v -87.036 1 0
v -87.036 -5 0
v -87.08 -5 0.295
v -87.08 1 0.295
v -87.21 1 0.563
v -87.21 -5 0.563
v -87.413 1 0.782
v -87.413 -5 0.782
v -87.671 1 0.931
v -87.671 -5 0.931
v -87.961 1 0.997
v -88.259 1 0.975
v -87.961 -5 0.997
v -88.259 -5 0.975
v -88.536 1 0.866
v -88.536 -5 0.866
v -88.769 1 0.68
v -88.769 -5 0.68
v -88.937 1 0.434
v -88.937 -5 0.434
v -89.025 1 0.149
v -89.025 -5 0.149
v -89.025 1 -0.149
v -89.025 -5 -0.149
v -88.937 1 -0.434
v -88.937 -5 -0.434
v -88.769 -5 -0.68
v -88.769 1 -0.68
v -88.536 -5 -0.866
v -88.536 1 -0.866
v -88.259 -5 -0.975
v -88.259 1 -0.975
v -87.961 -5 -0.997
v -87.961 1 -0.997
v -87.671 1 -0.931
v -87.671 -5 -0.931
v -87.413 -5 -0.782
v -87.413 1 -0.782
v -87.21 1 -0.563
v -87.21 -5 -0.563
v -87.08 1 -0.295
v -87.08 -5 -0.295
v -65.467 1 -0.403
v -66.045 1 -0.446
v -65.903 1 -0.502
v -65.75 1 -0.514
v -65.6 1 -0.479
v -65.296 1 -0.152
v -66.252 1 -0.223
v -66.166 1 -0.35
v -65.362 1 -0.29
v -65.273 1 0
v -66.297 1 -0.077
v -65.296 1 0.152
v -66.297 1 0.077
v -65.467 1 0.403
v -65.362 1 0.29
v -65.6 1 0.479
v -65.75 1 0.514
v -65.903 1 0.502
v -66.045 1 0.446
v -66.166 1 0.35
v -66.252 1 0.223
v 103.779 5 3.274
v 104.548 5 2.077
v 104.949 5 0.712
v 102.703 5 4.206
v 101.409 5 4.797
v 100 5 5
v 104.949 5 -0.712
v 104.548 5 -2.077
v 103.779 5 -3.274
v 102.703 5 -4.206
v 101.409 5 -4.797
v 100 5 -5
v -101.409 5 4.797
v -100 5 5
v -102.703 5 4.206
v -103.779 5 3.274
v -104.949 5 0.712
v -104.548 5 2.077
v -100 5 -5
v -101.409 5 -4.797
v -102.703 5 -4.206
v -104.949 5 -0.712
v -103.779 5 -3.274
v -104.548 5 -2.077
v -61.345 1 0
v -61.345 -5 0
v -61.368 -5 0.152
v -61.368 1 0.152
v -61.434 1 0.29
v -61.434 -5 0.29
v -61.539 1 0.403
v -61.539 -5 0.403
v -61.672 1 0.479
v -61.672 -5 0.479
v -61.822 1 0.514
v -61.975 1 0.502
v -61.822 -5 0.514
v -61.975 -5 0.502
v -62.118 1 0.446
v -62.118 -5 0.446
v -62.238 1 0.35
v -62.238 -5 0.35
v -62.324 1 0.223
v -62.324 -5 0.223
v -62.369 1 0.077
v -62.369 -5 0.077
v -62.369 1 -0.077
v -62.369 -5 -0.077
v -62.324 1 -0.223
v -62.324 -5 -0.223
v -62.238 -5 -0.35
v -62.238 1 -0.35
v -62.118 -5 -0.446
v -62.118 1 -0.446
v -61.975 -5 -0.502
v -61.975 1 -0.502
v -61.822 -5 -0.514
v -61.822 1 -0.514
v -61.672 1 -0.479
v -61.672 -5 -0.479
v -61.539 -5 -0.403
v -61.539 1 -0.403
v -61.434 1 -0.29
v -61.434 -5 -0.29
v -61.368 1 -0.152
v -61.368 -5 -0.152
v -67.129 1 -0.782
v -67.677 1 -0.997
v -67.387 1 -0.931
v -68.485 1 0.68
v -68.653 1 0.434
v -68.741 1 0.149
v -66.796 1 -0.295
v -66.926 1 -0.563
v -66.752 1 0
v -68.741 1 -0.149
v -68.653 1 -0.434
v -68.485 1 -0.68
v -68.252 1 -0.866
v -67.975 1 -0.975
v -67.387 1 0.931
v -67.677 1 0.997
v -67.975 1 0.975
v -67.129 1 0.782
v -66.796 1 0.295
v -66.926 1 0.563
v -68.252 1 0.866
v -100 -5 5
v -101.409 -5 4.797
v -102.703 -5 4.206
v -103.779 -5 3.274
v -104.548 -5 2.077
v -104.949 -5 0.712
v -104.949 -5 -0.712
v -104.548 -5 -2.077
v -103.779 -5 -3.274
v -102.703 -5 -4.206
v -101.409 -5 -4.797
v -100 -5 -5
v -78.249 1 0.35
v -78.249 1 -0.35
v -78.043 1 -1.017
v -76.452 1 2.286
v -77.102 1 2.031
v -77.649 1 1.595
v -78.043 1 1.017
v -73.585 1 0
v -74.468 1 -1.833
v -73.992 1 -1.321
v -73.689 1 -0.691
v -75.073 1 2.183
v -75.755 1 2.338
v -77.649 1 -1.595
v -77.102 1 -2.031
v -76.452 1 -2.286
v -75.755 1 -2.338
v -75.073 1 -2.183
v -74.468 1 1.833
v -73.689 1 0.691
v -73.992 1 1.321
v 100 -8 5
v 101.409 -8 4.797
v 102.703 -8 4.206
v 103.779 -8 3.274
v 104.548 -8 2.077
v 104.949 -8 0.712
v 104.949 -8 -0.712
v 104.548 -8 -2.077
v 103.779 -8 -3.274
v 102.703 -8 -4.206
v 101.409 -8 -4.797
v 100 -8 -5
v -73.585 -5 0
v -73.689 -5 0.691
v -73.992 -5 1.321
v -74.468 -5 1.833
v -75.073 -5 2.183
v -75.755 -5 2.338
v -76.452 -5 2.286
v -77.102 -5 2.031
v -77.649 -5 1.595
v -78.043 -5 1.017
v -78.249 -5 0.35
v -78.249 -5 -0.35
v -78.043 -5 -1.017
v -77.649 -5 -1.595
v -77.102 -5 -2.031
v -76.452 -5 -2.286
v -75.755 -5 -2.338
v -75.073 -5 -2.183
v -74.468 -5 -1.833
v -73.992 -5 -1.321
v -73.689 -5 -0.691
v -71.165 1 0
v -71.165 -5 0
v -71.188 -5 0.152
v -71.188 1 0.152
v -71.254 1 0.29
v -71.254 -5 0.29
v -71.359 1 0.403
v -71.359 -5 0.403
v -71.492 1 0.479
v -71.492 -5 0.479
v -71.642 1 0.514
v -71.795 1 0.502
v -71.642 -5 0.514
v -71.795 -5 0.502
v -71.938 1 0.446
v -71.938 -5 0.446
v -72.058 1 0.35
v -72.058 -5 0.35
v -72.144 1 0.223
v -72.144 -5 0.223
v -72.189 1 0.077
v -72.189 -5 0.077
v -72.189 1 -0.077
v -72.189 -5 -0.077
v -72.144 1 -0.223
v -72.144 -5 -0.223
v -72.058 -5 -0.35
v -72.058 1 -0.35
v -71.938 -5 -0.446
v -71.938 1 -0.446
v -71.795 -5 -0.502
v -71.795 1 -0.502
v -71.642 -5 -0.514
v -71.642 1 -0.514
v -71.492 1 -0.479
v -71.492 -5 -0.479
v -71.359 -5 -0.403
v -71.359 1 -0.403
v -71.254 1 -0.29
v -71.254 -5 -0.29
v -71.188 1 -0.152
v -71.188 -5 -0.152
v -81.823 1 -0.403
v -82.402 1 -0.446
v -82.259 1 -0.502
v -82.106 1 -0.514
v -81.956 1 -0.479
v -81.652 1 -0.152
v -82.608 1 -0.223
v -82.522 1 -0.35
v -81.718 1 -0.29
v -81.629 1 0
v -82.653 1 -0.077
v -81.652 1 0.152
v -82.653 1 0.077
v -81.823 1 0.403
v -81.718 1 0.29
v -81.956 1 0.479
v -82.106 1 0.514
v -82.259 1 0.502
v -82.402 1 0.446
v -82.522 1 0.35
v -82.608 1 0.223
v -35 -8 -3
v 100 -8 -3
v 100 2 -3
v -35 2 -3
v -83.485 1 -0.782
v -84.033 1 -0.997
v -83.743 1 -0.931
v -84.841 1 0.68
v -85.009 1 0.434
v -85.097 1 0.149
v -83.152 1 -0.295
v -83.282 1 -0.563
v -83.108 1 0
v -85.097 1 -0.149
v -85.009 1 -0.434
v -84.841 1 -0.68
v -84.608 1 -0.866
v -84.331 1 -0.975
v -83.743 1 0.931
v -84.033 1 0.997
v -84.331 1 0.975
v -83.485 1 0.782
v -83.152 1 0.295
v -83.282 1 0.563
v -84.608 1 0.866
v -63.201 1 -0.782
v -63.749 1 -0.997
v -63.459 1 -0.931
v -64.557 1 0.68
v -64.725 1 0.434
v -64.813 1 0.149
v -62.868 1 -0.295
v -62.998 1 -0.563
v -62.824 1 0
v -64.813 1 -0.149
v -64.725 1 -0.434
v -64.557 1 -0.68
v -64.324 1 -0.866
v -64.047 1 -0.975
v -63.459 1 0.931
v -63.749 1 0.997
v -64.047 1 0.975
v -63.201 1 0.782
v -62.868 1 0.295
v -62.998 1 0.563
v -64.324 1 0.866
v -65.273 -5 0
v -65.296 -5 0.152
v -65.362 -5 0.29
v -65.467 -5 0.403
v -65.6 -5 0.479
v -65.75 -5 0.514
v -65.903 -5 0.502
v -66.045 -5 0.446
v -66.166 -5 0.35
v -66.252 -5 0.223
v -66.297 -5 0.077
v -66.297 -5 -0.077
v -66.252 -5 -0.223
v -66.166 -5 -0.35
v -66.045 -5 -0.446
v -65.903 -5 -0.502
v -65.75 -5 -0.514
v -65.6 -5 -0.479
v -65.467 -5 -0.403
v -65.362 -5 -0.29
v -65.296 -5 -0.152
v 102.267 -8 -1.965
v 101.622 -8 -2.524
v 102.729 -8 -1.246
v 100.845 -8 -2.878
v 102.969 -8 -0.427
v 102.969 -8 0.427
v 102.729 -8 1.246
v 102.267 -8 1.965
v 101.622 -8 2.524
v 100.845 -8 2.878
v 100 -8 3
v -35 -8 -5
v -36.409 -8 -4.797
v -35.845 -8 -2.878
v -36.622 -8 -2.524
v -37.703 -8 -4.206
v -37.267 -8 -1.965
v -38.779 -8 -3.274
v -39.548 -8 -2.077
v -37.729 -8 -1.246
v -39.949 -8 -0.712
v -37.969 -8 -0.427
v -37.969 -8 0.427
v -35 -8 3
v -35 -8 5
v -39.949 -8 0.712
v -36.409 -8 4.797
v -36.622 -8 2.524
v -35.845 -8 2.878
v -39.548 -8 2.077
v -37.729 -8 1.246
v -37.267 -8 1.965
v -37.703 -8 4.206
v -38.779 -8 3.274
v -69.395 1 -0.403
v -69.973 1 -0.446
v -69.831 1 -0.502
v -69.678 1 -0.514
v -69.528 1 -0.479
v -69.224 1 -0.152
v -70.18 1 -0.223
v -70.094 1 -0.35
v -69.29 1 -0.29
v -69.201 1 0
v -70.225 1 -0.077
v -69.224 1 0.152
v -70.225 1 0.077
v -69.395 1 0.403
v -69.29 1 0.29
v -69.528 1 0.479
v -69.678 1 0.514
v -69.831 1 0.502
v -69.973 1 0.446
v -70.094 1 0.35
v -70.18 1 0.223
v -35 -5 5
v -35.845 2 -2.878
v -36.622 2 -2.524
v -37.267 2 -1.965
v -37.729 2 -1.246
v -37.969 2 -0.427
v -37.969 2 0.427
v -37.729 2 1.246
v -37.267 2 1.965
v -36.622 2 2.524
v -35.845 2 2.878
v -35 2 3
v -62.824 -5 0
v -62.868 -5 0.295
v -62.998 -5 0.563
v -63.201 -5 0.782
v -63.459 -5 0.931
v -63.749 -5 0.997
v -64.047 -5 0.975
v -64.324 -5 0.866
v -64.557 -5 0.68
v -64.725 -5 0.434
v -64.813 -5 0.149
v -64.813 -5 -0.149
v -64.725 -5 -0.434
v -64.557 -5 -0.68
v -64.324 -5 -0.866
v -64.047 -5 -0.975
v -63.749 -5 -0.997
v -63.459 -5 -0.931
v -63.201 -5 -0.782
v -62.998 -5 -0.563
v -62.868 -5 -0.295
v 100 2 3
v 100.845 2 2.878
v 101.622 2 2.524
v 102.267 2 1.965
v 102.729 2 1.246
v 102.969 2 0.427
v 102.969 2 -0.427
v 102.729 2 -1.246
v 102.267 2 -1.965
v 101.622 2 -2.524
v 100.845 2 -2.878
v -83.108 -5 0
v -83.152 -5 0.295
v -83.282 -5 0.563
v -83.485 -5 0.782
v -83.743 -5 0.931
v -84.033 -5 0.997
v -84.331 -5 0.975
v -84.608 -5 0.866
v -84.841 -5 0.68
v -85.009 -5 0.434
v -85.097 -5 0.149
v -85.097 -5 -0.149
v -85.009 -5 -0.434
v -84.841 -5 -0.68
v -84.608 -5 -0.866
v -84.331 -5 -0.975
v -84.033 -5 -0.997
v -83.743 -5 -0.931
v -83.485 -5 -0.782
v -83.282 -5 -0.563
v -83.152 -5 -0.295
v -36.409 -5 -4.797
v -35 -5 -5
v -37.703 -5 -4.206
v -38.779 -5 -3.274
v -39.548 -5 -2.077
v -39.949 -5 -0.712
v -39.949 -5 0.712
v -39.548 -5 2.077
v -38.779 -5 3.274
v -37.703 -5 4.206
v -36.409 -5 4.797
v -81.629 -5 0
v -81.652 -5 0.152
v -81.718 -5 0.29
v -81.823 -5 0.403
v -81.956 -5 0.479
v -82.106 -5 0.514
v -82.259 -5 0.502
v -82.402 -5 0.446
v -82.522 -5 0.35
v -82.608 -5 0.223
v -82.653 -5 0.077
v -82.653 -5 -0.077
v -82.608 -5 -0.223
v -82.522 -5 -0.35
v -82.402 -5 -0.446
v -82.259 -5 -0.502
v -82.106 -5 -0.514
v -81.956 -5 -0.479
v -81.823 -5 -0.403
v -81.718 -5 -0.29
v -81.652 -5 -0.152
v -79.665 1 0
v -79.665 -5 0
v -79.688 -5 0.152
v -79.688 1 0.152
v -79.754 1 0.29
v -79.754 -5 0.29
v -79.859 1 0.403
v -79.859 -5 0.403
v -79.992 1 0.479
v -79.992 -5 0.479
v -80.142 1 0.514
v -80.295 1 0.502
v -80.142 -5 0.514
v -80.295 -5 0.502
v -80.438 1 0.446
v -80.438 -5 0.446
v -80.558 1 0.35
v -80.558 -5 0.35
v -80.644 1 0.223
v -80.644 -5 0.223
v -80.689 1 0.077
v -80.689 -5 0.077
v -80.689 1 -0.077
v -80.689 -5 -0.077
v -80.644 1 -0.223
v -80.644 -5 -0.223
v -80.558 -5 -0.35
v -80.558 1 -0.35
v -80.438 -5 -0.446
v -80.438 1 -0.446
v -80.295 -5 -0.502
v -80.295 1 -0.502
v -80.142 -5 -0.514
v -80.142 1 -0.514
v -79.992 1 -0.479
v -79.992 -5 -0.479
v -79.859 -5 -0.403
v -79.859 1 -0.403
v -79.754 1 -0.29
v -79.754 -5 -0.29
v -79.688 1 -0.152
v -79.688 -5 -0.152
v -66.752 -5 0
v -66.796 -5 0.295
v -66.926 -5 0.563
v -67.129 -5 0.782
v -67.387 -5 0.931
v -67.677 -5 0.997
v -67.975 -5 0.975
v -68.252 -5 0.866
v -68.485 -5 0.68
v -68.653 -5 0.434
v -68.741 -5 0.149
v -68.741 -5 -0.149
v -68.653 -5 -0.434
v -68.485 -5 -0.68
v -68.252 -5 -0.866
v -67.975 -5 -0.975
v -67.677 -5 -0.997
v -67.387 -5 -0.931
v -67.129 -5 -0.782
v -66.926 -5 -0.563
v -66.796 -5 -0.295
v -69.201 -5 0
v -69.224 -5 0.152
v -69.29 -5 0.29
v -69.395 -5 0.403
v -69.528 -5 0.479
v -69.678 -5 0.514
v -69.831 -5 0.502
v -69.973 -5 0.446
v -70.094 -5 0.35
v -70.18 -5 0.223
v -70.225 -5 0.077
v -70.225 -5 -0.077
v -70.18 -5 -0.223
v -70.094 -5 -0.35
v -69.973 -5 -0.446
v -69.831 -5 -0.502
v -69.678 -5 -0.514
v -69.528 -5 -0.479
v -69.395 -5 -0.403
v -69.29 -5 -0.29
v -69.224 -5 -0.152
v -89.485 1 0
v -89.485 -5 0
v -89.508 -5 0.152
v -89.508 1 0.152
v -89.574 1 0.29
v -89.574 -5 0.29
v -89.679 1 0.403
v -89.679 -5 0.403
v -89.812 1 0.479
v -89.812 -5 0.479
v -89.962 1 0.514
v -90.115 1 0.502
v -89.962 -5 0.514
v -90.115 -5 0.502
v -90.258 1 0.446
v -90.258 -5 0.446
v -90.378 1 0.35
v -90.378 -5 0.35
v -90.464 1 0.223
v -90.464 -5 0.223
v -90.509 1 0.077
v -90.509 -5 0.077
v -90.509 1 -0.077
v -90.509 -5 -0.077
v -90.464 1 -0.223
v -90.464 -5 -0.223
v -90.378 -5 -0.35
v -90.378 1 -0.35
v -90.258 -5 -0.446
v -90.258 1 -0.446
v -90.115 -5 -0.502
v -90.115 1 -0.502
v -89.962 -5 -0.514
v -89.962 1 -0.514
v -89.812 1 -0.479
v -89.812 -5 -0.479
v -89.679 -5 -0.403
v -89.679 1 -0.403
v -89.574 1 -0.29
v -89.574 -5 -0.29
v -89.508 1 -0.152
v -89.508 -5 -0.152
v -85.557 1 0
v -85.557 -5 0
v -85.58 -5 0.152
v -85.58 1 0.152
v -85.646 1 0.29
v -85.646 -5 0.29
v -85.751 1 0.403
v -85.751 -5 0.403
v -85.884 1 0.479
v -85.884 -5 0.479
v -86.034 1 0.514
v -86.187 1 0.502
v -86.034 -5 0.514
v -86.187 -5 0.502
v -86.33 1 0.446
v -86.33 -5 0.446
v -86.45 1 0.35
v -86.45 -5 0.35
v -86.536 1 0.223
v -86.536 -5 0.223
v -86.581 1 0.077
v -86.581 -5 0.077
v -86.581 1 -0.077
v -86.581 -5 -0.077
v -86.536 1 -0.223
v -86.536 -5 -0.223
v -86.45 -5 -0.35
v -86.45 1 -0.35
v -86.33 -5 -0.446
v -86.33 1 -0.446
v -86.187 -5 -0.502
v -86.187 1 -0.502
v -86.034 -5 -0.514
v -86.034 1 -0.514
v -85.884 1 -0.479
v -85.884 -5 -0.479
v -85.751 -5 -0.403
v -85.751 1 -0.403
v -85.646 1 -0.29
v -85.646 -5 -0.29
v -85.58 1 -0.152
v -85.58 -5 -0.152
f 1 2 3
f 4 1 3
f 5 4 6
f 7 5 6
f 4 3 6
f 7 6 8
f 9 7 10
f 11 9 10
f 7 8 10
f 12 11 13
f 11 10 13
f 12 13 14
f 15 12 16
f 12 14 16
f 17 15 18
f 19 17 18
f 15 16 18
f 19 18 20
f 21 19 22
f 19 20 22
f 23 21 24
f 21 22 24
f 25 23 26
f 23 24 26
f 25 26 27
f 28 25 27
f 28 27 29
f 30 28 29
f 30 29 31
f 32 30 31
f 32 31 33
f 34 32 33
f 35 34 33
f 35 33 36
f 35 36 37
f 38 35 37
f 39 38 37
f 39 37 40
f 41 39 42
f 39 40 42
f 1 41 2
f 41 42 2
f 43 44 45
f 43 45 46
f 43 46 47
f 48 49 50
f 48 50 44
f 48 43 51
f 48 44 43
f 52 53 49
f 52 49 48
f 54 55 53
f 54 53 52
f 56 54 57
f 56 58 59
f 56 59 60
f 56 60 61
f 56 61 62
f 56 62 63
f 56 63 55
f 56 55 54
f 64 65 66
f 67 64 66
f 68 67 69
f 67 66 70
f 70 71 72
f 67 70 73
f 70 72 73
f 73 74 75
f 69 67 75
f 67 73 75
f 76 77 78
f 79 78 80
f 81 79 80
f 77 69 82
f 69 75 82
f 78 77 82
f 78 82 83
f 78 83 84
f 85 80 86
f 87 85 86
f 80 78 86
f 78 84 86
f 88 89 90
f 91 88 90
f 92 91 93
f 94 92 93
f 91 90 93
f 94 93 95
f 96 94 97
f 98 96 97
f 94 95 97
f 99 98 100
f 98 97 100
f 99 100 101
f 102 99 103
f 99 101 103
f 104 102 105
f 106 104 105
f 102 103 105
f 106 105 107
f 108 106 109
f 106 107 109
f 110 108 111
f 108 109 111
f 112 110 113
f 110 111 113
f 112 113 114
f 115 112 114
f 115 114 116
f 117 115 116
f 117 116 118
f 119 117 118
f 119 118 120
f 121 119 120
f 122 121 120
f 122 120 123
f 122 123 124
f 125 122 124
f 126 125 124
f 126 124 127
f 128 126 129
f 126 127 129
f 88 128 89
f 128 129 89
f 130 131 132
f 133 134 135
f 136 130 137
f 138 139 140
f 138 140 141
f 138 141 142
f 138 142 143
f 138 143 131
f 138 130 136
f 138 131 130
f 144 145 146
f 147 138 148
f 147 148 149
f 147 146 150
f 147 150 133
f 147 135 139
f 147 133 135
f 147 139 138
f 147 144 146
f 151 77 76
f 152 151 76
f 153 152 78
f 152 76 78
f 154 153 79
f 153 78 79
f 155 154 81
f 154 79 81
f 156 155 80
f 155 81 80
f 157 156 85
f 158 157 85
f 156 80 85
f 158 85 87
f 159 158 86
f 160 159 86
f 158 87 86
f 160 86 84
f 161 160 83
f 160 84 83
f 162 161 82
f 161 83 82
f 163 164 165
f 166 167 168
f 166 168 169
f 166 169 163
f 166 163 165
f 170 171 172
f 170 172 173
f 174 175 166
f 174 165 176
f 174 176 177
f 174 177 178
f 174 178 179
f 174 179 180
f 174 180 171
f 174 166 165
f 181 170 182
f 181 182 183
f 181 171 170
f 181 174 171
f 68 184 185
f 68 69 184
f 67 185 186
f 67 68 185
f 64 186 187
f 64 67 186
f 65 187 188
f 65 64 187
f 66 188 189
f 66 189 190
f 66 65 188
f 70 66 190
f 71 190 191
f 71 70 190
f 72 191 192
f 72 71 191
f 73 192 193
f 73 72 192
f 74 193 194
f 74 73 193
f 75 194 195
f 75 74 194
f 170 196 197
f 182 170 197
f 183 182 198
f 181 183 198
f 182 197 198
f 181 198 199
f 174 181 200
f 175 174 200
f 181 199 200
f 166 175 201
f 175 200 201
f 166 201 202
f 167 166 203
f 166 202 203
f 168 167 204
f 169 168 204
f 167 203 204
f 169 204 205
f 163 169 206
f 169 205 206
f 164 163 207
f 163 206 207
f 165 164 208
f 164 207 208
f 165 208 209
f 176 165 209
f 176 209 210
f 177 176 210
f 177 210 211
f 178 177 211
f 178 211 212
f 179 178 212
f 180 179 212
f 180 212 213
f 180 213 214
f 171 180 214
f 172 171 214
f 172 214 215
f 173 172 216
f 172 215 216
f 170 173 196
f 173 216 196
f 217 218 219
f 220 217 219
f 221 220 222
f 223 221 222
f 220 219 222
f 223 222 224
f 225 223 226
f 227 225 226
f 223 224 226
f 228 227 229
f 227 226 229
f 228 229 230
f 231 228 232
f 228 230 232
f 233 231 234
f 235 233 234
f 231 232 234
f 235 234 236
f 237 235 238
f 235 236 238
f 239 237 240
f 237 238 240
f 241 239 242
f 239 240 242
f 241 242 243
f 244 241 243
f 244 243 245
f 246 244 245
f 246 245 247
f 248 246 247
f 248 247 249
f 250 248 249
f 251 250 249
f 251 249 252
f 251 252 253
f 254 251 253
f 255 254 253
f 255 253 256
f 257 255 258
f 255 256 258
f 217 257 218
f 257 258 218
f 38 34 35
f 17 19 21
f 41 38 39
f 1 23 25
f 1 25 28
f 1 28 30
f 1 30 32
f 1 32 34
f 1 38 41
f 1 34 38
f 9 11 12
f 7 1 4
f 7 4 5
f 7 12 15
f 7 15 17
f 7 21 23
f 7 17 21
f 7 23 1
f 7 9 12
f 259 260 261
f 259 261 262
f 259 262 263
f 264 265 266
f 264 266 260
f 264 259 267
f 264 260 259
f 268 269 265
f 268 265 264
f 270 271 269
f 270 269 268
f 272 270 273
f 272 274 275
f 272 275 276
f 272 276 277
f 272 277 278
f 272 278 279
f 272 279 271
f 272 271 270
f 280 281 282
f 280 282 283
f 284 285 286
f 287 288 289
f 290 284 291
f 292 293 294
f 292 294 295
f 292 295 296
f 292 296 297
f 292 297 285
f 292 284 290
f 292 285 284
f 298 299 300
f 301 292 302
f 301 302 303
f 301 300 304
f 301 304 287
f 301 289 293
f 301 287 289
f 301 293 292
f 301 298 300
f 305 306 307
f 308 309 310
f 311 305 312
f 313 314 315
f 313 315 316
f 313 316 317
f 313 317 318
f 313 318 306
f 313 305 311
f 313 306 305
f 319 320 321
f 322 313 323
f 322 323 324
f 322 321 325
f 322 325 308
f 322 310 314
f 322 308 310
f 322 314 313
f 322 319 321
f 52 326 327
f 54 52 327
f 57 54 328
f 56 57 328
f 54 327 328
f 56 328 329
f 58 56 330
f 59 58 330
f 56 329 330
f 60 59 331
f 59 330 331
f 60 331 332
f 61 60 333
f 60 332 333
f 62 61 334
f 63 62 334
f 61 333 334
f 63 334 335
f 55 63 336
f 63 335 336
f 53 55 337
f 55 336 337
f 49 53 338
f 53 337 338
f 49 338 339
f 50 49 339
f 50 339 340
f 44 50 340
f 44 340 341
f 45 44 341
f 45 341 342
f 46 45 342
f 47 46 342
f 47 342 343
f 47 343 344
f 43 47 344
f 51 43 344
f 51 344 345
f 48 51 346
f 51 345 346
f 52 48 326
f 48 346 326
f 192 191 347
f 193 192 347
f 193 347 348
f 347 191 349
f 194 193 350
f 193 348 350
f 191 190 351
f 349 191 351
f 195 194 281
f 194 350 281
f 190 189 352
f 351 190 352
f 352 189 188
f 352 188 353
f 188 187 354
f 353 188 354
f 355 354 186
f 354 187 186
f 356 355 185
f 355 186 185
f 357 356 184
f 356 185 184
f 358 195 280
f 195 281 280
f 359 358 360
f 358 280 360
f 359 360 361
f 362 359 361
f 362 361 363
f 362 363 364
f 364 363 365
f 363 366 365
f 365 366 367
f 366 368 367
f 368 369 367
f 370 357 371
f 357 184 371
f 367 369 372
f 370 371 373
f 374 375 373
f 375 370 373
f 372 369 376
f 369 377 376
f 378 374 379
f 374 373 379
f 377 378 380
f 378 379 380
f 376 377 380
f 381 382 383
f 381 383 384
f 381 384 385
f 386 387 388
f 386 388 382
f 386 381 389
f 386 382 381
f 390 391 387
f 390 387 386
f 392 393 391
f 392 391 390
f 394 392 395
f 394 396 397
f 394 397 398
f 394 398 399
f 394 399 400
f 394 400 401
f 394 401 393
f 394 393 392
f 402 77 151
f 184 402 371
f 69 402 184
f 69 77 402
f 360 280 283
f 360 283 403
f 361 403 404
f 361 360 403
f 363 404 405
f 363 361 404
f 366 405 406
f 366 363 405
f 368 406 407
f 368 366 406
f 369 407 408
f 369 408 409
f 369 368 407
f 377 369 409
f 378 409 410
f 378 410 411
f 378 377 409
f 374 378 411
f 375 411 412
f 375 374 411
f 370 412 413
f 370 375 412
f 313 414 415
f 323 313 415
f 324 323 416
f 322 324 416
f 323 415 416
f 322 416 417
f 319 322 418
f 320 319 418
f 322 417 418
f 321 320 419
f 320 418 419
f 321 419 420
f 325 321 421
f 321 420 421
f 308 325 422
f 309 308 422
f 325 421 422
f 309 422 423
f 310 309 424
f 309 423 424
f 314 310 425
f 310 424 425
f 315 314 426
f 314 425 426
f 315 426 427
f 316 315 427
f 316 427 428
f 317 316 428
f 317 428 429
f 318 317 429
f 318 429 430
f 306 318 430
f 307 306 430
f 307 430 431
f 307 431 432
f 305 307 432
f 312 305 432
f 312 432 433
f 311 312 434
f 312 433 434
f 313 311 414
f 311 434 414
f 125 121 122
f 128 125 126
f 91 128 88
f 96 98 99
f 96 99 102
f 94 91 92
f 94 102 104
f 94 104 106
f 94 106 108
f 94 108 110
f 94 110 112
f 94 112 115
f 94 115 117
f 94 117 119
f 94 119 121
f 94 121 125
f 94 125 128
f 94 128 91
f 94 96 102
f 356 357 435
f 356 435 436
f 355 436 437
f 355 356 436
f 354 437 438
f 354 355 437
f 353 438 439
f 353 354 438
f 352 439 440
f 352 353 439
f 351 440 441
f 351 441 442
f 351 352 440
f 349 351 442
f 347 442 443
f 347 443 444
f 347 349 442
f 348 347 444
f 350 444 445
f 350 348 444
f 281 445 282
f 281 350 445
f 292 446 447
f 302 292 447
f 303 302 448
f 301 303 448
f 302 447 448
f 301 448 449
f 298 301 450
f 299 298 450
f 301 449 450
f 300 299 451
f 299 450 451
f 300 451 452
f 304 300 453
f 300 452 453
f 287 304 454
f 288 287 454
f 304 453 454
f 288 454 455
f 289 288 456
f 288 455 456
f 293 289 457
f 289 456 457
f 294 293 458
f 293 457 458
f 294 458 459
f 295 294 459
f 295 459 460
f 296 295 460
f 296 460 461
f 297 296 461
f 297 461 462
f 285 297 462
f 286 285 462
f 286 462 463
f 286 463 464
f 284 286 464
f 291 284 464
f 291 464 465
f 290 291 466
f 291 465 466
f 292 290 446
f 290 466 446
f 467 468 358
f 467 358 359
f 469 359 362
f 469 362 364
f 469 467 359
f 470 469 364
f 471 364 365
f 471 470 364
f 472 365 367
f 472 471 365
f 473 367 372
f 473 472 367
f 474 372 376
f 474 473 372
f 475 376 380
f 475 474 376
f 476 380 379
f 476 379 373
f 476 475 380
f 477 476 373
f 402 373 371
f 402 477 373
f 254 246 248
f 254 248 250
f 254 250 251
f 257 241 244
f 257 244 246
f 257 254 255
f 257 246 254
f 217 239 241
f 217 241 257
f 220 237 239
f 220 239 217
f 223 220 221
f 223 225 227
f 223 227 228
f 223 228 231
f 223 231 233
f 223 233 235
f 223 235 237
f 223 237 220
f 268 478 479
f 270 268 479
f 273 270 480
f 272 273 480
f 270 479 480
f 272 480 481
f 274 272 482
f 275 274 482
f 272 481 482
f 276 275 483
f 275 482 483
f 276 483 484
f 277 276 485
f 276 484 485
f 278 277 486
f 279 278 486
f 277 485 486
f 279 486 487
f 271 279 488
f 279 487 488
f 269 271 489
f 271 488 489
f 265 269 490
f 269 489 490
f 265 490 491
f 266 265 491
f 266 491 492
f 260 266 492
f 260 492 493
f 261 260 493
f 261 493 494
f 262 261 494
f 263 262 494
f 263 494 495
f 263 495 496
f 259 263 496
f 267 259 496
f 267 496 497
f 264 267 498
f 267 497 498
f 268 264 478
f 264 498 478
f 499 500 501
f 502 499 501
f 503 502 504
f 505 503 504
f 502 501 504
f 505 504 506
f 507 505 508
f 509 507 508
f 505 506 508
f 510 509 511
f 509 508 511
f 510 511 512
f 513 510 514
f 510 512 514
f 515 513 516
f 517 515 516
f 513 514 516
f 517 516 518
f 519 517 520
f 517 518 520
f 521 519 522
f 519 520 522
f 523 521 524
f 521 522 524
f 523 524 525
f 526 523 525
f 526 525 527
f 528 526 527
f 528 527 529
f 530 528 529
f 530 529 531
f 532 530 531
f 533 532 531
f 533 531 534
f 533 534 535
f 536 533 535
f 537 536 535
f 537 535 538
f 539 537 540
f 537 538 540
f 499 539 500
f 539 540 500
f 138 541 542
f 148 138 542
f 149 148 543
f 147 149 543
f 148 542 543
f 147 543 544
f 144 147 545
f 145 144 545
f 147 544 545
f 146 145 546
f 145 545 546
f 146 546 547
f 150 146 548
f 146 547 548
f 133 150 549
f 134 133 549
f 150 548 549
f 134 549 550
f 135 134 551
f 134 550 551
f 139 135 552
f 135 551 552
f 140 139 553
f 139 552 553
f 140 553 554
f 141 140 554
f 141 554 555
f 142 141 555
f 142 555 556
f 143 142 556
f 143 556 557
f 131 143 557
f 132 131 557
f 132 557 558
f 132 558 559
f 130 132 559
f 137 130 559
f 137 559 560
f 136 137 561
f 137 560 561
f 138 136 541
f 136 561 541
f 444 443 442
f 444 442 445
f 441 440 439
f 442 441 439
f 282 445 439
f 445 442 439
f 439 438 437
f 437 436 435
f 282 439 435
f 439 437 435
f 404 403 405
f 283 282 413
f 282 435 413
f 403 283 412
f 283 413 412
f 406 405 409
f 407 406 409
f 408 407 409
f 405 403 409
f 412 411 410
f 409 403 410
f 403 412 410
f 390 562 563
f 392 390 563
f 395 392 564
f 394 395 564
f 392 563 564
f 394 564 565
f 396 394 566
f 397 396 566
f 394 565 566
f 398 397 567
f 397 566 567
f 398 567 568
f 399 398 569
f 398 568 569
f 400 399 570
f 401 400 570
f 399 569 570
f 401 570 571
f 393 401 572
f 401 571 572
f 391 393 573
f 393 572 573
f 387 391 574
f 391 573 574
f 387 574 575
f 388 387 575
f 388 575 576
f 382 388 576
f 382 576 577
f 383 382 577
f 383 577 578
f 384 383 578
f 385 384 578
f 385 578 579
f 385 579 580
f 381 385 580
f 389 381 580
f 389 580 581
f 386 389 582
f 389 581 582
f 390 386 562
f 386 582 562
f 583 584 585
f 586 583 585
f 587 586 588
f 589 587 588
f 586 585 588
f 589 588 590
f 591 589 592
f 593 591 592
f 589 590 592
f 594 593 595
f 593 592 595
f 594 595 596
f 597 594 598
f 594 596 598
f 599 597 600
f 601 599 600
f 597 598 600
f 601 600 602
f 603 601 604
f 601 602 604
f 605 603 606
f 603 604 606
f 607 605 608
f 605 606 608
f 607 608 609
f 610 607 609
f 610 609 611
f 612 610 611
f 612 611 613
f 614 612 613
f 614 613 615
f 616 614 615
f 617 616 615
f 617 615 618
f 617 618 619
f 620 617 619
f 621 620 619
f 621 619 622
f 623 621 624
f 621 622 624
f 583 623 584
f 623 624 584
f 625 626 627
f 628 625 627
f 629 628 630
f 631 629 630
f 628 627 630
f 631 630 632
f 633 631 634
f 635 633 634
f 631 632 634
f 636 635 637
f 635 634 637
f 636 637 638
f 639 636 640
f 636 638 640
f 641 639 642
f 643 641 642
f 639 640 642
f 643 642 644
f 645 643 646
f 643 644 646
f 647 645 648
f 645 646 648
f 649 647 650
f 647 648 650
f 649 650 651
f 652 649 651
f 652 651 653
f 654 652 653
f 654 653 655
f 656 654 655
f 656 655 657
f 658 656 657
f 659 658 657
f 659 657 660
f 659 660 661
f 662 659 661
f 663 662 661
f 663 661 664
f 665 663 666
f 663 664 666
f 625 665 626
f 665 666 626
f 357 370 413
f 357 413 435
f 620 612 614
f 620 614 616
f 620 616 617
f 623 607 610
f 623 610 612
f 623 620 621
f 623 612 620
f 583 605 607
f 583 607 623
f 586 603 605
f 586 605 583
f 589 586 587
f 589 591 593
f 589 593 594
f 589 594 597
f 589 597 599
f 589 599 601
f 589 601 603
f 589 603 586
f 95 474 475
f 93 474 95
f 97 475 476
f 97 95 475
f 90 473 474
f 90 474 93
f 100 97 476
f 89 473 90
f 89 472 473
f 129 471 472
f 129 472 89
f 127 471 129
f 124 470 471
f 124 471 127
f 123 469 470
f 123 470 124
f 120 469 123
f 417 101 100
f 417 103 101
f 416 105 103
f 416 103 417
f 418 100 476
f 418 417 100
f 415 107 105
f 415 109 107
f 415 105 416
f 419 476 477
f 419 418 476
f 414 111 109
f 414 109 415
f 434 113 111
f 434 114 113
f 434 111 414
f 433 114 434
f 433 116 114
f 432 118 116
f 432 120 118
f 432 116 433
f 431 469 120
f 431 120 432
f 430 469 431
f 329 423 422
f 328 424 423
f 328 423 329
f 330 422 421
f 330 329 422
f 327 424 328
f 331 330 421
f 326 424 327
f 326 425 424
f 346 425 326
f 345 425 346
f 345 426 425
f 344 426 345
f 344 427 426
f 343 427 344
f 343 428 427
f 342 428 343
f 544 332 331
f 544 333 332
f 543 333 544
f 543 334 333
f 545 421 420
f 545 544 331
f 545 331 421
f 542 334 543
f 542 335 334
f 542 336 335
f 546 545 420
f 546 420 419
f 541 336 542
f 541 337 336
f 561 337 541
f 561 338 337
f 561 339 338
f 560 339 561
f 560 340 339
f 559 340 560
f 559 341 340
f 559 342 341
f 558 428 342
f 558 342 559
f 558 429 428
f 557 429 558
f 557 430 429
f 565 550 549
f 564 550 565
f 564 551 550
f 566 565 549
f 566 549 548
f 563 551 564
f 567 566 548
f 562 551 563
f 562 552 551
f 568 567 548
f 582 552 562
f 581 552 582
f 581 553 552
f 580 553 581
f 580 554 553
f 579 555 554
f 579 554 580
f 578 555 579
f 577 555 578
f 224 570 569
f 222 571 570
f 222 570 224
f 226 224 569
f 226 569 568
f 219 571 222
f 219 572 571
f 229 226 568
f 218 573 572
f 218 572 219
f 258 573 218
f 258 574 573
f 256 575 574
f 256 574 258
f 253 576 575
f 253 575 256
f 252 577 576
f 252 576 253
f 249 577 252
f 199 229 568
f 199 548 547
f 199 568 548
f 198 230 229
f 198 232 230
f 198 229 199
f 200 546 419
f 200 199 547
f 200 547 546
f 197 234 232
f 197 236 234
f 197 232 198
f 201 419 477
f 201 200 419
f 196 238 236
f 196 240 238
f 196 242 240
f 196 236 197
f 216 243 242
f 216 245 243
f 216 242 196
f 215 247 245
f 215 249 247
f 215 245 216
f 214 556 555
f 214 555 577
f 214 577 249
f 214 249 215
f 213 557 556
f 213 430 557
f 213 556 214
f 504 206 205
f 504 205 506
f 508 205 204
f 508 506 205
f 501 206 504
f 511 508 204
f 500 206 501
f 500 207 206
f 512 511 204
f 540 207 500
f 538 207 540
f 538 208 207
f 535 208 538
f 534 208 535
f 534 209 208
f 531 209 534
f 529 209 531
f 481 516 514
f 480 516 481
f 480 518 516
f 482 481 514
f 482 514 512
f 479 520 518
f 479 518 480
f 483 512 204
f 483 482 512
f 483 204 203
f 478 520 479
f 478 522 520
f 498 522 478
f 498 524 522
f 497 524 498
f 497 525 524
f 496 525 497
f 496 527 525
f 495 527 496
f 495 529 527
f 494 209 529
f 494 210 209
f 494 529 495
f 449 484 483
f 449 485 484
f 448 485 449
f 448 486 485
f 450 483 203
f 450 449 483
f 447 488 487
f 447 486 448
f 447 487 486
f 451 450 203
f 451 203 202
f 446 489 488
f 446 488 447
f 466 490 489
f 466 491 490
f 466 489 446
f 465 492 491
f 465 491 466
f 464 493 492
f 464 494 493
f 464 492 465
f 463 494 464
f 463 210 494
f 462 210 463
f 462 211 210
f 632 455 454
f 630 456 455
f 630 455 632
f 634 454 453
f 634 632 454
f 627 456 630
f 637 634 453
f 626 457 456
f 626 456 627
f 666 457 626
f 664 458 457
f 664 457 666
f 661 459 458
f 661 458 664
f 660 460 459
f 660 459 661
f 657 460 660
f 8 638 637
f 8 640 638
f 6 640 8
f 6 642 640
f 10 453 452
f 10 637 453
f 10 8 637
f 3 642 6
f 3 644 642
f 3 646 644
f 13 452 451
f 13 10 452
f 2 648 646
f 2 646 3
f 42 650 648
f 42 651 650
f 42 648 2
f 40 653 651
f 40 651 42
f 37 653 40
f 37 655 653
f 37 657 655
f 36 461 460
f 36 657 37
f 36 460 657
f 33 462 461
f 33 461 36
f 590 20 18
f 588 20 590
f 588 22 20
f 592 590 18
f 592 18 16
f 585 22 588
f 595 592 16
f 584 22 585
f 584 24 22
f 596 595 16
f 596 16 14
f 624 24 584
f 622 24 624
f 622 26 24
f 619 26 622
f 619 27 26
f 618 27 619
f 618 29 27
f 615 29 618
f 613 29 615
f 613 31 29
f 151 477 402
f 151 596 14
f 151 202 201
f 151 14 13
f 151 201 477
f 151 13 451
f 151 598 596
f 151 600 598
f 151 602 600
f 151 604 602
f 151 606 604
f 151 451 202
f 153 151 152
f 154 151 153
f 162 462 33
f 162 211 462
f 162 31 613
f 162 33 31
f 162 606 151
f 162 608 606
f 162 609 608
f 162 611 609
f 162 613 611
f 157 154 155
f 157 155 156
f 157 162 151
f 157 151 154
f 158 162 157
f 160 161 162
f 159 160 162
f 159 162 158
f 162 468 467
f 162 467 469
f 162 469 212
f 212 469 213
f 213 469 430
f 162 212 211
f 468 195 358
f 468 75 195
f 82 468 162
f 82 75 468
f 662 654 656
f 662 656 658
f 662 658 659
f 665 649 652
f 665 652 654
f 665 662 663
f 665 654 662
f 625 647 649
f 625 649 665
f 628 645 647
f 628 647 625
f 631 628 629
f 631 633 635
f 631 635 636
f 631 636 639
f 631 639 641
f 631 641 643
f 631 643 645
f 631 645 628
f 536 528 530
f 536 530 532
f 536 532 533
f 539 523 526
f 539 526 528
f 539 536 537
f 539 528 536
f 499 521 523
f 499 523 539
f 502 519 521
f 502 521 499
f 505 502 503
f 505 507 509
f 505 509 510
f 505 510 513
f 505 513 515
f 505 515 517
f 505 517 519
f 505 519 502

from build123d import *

# Parameters (mm, degrees)
EXTRUDE_1_DEPTH     = 5
SKETCH_3_R          = 0.515
SKETCH_3_R_2        = 1
SKETCH_3_R_3        = 2.345
CUT_EXTRUDE_1_DEPTH = 6
EXTRUDE_2_DEPTH     = 3
CUT_EXTRUDE_2_DEPTH = 10


with BuildPart() as part:
    # 스케치1 → 보스-돌출1 (new body, symmetric)
    with BuildSketch(Plane(origin=(0, 0, 0), x_dir=(1, 0, 0), z_dir=(0, 1, 0))):
        with BuildLine():
            Line((-100, 5), (100, 5))
            ThreePointArc((100, 5), (105, 0), (100, -5))
            Line((100, -5), (-100, -5))
            ThreePointArc((-100, -5), (-105, 0), (-100, 5))
        make_face()
    extrude(amount=EXTRUDE_1_DEPTH, both=True)

    # 스케치3 → 컷-돌출1 (cut)
    with BuildSketch(Plane.XZ.offset(5)):
        with Locations((-90, 0)):
            Circle(SKETCH_3_R)
        with Locations((-88.036, 0)):
            Circle(SKETCH_3_R_2)
        with Locations((-86.072, 0)):
            Circle(SKETCH_3_R)
        with Locations((-84.108, 0)):
            Circle(SKETCH_3_R_2)
        with Locations((-82.144, 0)):
            Circle(SKETCH_3_R)
        with Locations((-80.18, 0)):
            Circle(SKETCH_3_R)
        with Locations((-75.93, 0)):
            Circle(SKETCH_3_R_3)
        with Locations((-71.68, 0)):
            Circle(SKETCH_3_R)
        with Locations((-69.716, 0)):
            Circle(SKETCH_3_R)
        with Locations((-67.752, 0)):
            Circle(SKETCH_3_R_2)
        with Locations((-65.788, 0)):
            Circle(SKETCH_3_R)
        with Locations((-61.86, 0)):
            Circle(SKETCH_3_R)
        with Locations((-63.824, 0)):
            Circle(SKETCH_3_R_2)
    extrude(amount=-CUT_EXTRUDE_1_DEPTH, mode=Mode.SUBTRACT)

    # 스케치5 → 보스-돌출2 (add)
    with BuildSketch(Plane.XZ.offset(5)):
        with BuildLine():
            Line((100, -5), (-35, -5))
            ThreePointArc((-35, -5), (-40, 0), (-35, 5))
            Line((-35, 5), (100, 5))
            ThreePointArc((100, 5), (105, 0), (100, -5))
        make_face()
    extrude(amount=EXTRUDE_2_DEPTH)

    # 스케치6 → 컷-돌출2 (cut)
    with BuildSketch(Plane.XZ.offset(8)):
        with BuildLine():
            Line((-35, 3), (100, 3))
            ThreePointArc((100, 3), (103, 0), (100, -3))
            Line((100, -3), (-35, -3))
            ThreePointArc((-35, -3), (-38, 0), (-35, 3))
        make_face()
    extrude(amount=-CUT_EXTRUDE_2_DEPTH, mode=Mode.SUBTRACT)


solid = part.part
